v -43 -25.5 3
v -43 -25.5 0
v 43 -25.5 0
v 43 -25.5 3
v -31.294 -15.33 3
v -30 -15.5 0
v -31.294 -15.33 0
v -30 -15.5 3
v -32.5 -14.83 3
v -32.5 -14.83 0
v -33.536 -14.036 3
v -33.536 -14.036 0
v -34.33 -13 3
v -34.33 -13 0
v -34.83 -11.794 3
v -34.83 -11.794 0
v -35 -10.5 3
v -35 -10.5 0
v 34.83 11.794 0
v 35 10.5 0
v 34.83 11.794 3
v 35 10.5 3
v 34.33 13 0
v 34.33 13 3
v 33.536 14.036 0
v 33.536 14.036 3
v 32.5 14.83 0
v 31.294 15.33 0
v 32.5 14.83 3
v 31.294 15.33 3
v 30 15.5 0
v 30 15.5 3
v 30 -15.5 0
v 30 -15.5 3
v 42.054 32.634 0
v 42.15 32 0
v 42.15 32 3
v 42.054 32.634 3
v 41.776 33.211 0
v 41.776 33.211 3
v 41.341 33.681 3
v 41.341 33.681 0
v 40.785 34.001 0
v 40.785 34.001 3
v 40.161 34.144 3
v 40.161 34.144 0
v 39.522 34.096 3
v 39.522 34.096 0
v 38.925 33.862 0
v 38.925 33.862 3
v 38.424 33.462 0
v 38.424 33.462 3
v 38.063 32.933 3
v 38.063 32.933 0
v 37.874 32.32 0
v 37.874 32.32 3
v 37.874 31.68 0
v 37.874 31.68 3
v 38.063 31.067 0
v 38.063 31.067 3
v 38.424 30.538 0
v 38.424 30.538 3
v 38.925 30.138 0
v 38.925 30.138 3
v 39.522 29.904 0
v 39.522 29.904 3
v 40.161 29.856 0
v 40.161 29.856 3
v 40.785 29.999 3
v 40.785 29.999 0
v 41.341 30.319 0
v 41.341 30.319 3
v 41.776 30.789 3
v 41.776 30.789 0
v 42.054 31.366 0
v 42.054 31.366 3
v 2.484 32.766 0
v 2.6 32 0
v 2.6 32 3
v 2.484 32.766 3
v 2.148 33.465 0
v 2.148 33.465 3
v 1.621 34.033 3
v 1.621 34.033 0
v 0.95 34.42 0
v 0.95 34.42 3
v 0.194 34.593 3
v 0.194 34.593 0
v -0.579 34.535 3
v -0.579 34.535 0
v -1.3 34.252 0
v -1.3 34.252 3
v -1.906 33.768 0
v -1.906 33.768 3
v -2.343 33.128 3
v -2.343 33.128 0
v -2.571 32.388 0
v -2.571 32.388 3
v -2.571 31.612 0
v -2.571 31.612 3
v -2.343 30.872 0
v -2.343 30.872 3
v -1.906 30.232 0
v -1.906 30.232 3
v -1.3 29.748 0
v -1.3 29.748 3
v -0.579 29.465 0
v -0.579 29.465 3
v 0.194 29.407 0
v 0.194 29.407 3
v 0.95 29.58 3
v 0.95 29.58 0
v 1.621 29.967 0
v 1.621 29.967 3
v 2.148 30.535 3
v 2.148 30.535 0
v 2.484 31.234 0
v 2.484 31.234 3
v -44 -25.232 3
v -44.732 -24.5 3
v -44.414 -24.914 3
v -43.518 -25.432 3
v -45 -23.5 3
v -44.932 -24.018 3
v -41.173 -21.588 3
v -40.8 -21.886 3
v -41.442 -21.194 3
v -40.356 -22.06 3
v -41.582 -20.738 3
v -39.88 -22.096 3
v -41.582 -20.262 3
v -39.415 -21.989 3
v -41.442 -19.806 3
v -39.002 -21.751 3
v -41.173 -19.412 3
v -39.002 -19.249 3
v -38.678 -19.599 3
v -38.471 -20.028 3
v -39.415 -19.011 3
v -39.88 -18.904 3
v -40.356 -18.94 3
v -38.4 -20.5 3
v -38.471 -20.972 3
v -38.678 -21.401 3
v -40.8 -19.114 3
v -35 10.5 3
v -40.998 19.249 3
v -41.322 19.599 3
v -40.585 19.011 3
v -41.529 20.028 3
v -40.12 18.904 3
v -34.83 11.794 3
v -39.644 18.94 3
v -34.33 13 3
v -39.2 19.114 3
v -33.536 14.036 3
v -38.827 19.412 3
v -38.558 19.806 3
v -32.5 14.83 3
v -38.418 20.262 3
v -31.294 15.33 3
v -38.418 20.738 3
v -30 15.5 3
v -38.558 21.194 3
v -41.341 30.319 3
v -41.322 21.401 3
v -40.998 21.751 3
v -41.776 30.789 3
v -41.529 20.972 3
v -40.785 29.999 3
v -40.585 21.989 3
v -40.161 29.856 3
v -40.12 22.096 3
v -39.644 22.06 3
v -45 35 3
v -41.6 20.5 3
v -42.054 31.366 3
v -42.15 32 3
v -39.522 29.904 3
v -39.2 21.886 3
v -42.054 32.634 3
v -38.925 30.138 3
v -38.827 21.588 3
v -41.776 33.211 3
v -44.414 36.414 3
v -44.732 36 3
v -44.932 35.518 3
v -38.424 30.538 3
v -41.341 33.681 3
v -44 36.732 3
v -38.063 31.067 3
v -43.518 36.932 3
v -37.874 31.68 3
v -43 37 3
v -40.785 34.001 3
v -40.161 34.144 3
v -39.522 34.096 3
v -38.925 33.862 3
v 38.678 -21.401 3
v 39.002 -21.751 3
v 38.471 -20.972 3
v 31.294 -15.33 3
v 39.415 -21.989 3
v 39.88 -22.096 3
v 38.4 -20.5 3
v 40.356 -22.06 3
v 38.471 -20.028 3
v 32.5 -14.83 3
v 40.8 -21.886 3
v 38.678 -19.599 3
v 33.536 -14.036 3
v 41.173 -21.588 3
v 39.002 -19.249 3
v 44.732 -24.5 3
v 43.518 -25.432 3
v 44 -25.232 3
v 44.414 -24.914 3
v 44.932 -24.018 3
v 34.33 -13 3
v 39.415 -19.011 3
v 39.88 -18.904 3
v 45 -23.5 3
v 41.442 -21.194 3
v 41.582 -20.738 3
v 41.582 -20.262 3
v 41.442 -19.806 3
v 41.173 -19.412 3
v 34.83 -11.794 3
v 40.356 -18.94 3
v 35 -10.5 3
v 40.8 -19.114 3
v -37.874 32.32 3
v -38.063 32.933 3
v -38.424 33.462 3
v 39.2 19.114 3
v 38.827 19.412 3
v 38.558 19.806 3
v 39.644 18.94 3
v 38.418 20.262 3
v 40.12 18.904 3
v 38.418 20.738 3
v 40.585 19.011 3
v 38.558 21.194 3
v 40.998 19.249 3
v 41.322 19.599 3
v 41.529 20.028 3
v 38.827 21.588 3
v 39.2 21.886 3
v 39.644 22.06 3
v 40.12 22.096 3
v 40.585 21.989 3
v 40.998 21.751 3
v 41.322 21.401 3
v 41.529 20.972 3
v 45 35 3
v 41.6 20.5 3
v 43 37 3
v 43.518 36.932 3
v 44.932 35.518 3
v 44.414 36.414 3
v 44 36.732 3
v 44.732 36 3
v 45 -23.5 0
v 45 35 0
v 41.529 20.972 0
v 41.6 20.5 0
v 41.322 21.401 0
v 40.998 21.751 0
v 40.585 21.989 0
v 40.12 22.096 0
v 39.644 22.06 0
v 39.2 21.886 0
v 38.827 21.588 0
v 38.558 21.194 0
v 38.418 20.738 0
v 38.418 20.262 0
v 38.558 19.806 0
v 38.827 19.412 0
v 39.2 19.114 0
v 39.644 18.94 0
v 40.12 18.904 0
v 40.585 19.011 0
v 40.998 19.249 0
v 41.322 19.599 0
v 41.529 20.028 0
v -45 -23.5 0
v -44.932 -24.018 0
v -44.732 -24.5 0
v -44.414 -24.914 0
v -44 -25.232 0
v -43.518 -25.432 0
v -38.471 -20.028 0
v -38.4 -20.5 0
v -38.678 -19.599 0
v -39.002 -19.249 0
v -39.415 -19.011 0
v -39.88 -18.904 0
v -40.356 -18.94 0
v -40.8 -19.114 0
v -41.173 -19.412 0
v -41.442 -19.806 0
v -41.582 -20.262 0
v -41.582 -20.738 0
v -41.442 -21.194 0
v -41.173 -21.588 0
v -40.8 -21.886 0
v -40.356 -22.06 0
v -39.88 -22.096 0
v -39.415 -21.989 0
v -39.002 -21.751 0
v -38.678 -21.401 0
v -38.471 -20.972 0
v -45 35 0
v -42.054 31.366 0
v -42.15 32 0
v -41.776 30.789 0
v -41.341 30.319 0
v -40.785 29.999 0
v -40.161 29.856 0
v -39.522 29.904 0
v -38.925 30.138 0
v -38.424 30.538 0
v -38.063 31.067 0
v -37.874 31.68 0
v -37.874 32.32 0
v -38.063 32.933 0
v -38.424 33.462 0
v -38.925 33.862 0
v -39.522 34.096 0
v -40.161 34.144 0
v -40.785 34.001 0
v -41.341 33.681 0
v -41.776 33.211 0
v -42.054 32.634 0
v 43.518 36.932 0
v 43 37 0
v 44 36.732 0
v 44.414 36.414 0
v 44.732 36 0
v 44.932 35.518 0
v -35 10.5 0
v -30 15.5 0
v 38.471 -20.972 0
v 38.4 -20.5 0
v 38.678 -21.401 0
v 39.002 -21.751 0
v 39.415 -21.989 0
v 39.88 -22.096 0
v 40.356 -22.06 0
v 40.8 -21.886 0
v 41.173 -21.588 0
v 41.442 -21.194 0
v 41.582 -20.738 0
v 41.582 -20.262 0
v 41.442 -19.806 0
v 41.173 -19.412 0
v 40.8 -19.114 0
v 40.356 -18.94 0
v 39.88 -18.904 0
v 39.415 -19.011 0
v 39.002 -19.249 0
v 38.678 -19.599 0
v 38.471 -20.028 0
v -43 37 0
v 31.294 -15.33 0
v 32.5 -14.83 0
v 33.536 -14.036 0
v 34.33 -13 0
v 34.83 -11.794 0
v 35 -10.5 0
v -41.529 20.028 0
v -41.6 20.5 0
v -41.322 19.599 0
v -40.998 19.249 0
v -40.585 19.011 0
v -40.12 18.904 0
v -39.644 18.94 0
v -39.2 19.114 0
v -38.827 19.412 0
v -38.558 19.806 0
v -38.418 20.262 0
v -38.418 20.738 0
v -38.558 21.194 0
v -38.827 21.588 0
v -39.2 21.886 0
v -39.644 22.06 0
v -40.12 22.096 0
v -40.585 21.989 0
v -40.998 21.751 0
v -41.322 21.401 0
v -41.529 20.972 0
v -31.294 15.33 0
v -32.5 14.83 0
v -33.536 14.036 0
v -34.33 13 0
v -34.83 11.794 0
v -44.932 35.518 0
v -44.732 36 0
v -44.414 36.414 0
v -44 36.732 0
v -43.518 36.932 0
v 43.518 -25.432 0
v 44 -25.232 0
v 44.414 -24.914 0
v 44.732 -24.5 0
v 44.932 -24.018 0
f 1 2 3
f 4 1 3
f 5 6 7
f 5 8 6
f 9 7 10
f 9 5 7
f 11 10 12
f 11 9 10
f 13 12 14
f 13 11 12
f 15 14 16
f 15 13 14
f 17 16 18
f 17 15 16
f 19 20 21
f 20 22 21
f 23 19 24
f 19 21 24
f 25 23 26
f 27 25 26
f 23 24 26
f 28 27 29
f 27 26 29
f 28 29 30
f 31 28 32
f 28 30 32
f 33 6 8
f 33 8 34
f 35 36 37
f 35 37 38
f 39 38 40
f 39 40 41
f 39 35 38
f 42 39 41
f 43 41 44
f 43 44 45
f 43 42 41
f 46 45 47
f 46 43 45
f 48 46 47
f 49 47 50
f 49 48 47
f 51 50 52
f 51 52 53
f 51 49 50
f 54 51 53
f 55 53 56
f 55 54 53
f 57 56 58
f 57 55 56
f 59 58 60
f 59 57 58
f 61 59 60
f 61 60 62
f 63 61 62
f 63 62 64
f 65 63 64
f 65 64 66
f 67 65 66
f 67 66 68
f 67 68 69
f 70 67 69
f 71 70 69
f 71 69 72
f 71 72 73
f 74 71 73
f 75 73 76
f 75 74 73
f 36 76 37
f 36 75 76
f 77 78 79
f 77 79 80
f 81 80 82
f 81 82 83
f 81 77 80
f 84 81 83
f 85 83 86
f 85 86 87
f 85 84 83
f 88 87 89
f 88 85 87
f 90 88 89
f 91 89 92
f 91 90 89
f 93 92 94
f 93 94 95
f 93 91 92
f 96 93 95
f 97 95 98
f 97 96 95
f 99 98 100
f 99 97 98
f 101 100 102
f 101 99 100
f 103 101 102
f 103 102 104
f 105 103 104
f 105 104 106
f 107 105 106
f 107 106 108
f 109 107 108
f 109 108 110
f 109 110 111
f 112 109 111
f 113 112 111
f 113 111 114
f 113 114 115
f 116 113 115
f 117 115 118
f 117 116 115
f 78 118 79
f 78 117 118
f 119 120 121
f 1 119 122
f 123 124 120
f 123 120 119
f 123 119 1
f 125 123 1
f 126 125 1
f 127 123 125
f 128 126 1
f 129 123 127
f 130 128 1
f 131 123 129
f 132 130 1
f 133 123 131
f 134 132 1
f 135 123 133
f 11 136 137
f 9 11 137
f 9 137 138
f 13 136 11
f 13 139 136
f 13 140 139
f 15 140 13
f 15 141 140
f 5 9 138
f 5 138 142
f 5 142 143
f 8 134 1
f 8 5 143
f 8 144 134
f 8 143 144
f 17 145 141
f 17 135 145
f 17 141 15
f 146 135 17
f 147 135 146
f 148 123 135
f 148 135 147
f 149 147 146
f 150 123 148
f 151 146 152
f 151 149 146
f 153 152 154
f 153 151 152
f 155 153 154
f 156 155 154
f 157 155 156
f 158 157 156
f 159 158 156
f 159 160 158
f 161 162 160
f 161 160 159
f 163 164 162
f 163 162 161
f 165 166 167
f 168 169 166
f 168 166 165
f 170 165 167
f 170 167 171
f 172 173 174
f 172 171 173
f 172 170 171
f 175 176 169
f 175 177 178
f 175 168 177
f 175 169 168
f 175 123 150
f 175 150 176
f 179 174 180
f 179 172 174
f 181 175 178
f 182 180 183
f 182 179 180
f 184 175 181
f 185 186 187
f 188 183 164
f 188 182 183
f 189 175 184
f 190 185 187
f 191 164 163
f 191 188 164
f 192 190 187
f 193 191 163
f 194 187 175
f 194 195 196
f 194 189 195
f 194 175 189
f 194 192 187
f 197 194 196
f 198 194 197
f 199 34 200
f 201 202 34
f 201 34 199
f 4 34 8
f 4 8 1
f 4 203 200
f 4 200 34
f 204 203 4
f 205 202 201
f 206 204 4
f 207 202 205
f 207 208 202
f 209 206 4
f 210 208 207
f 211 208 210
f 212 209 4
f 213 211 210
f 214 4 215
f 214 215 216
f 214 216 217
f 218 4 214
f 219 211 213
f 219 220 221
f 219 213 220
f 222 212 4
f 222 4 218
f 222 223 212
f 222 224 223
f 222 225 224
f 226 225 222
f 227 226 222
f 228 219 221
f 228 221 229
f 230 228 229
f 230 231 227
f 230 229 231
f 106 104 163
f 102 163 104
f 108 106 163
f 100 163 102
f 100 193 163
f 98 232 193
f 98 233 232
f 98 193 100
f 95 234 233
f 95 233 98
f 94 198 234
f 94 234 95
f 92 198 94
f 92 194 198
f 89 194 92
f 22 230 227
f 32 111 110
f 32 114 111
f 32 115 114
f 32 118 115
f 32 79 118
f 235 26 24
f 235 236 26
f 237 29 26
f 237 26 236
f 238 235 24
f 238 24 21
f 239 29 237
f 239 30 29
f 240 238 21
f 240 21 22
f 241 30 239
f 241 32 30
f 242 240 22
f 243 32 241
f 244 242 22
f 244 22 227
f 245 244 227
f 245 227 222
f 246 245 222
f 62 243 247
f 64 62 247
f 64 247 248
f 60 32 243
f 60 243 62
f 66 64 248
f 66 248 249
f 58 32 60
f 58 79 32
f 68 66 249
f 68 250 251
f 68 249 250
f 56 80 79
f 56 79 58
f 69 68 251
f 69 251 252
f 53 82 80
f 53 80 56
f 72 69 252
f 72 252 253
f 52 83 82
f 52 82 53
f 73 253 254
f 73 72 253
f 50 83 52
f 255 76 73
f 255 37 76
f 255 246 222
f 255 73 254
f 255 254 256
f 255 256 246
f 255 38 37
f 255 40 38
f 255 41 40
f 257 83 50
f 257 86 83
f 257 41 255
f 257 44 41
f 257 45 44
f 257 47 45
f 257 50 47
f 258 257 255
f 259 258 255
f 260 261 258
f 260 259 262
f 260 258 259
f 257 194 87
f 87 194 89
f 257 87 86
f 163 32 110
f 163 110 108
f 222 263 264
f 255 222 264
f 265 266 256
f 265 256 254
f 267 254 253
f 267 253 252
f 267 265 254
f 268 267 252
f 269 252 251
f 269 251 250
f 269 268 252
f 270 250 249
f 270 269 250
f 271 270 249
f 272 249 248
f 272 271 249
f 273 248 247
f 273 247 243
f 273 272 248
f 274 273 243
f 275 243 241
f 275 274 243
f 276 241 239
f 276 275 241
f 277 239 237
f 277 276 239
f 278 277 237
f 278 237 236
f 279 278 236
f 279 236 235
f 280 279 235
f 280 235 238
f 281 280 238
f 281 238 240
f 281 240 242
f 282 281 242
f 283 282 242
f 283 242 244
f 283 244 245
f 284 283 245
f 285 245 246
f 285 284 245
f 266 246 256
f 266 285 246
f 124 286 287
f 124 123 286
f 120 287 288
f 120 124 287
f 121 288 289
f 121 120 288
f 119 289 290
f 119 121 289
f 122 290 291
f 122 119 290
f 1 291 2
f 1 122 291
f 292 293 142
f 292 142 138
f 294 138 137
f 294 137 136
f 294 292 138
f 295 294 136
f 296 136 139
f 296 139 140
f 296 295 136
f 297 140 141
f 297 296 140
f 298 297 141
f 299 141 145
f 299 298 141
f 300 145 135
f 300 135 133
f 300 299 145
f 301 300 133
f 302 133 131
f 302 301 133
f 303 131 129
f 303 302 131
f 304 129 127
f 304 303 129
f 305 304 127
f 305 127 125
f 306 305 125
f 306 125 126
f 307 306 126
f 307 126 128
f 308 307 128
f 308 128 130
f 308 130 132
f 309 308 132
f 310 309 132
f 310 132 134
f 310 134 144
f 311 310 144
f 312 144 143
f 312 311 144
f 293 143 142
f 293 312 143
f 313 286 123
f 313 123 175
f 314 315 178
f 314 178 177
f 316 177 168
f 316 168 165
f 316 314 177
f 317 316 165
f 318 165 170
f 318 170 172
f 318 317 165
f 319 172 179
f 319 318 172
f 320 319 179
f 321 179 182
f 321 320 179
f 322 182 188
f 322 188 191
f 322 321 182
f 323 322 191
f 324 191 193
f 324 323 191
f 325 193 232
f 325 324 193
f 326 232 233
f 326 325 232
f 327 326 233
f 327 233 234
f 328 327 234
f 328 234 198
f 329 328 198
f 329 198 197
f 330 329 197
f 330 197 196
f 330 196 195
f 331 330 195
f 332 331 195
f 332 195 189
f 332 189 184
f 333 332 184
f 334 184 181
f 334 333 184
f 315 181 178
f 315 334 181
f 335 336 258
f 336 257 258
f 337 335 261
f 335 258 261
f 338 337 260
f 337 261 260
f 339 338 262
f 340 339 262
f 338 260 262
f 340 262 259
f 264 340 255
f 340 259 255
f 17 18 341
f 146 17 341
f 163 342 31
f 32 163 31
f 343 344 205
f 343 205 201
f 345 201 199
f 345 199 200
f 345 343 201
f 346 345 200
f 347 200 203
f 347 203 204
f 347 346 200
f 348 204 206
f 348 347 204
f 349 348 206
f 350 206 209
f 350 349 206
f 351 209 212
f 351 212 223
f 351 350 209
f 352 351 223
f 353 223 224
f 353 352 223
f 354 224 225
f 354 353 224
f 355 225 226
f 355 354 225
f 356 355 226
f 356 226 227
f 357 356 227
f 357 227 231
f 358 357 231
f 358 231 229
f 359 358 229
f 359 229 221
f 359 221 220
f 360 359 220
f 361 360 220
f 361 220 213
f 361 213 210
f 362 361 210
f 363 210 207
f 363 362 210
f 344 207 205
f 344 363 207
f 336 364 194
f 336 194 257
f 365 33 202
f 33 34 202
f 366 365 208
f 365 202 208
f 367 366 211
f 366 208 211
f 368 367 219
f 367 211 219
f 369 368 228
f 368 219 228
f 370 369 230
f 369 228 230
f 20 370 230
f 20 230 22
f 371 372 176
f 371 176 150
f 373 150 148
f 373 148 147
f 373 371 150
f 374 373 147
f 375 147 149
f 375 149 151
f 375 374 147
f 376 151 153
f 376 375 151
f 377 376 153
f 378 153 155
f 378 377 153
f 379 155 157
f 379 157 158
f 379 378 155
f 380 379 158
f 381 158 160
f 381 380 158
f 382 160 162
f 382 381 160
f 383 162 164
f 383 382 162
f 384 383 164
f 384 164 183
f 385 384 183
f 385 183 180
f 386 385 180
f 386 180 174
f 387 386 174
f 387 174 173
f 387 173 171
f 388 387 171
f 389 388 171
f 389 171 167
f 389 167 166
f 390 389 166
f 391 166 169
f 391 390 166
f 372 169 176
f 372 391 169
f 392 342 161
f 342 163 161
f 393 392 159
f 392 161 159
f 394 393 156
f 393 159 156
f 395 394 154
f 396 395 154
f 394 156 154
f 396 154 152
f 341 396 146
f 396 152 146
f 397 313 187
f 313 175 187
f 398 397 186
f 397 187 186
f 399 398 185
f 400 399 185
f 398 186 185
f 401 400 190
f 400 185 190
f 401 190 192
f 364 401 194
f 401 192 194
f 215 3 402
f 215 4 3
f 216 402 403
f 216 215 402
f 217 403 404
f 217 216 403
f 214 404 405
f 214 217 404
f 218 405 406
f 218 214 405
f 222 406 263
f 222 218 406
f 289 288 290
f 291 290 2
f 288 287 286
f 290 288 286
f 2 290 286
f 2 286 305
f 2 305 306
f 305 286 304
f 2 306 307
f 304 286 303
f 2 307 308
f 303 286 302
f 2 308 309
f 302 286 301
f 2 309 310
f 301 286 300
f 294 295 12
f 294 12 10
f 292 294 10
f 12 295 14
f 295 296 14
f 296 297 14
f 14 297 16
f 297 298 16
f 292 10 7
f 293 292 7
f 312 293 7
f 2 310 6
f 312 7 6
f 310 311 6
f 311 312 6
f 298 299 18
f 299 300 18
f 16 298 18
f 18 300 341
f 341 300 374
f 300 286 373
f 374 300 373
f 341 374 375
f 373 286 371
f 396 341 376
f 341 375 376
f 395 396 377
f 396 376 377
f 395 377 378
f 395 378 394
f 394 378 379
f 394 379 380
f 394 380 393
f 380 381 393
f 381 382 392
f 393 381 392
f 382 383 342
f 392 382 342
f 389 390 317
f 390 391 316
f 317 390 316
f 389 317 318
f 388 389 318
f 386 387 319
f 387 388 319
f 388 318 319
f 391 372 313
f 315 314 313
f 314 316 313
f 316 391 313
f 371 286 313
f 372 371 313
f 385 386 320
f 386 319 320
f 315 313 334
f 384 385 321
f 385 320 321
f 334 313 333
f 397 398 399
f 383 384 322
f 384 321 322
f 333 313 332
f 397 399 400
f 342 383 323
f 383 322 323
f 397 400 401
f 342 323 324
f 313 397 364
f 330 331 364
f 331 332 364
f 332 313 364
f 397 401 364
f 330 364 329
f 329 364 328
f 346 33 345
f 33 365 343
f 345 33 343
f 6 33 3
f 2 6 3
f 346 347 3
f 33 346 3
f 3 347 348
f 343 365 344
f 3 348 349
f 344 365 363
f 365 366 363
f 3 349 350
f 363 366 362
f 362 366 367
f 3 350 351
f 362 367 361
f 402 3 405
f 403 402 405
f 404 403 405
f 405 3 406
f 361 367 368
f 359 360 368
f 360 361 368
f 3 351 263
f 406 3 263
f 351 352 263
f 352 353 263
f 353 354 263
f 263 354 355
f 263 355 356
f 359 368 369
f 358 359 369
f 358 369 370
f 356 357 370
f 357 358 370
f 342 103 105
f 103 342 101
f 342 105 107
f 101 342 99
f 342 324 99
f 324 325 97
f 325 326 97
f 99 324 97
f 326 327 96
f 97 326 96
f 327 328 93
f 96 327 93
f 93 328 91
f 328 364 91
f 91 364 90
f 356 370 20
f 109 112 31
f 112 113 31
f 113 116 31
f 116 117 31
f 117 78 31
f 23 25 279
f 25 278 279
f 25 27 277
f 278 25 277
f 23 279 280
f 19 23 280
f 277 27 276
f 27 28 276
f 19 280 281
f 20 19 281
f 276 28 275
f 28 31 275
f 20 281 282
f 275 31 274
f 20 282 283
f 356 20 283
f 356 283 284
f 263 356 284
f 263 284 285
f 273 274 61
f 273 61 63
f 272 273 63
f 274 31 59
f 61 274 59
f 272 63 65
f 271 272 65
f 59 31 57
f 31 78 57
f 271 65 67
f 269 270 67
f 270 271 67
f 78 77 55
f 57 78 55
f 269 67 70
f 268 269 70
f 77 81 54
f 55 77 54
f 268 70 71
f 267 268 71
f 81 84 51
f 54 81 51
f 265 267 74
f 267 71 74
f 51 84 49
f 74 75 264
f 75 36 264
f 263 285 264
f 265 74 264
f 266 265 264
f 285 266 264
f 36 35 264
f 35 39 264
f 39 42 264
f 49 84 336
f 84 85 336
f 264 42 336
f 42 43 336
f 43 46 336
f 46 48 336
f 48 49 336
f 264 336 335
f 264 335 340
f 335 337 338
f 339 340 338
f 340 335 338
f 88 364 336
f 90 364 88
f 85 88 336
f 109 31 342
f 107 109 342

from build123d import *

# Parameters (mm, degrees)
SKETCH_1_W      = 90
SKETCH_1_H      = 62.5
SKETCH_1_R      = 1.6
SKETCH_1_R_2    = 2.15
SKETCH_1_R_3    = 2.6
SKETCH_1_W_2    = 70
SKETCH_1_H_2    = 31
EXTRUDE_1_DEPTH = 3
FILLET_1_R      = 5
FILLET_2_R      = 2


with BuildPart() as part:
    # ｽｹｯﾁ1 → ﾎﾞｽ - 押し出し1 (new body)
    with BuildSketch(Plane.XY):
        with Locations((0, 5.75)):
            Rectangle(SKETCH_1_W, SKETCH_1_H)
        with Locations((40, 20.5)):
            Circle(SKETCH_1_R, mode=Mode.SUBTRACT)
        with Locations((40, 32)):
            Circle(SKETCH_1_R_2, mode=Mode.SUBTRACT)
        with Locations(Location((-40, 32, 0), (0, 0, 180))):
            Circle(SKETCH_1_R_2, mode=Mode.SUBTRACT)
        with Locations(Location((40, -20.5, 0), (0, 0, 180))):
            Circle(SKETCH_1_R, mode=Mode.SUBTRACT)
        with Locations(Location((-40, 20.5, 0), (0, 0, 180))):
            Circle(SKETCH_1_R, mode=Mode.SUBTRACT)
        with Locations((-40, -20.5)):
            Circle(SKETCH_1_R, mode=Mode.SUBTRACT)
        with Locations((0, 32)):
            Circle(SKETCH_1_R_3, mode=Mode.SUBTRACT)
        Rectangle(SKETCH_1_W_2, SKETCH_1_H_2, mode=Mode.SUBTRACT)
    extrude(amount=EXTRUDE_1_DEPTH)

    # ﾌｨﾚｯﾄ1
    fillet_1_edges = [part.edges().sort_by_distance(p)[0] for p in [
        (-35, 15.5, 1.5),
        (-35, -15.5, 1.5),
        (35, -15.5, 1.5),
        (35, 15.5, 1.5),
    ]]
    fillet(fillet_1_edges, radius=FILLET_1_R)

    # ﾌｨﾚｯﾄ2
    fillet_2_edges = [part.edges().sort_by_distance(p)[0] for p in [
        (45, -25.5, 1.5),
        (-45, -25.5, 1.5),
        (-45, 37, 1.5),
        (45, 37, 1.5),
    ]]
    fillet(fillet_2_edges, radius=FILLET_2_R)


solid = part.part
